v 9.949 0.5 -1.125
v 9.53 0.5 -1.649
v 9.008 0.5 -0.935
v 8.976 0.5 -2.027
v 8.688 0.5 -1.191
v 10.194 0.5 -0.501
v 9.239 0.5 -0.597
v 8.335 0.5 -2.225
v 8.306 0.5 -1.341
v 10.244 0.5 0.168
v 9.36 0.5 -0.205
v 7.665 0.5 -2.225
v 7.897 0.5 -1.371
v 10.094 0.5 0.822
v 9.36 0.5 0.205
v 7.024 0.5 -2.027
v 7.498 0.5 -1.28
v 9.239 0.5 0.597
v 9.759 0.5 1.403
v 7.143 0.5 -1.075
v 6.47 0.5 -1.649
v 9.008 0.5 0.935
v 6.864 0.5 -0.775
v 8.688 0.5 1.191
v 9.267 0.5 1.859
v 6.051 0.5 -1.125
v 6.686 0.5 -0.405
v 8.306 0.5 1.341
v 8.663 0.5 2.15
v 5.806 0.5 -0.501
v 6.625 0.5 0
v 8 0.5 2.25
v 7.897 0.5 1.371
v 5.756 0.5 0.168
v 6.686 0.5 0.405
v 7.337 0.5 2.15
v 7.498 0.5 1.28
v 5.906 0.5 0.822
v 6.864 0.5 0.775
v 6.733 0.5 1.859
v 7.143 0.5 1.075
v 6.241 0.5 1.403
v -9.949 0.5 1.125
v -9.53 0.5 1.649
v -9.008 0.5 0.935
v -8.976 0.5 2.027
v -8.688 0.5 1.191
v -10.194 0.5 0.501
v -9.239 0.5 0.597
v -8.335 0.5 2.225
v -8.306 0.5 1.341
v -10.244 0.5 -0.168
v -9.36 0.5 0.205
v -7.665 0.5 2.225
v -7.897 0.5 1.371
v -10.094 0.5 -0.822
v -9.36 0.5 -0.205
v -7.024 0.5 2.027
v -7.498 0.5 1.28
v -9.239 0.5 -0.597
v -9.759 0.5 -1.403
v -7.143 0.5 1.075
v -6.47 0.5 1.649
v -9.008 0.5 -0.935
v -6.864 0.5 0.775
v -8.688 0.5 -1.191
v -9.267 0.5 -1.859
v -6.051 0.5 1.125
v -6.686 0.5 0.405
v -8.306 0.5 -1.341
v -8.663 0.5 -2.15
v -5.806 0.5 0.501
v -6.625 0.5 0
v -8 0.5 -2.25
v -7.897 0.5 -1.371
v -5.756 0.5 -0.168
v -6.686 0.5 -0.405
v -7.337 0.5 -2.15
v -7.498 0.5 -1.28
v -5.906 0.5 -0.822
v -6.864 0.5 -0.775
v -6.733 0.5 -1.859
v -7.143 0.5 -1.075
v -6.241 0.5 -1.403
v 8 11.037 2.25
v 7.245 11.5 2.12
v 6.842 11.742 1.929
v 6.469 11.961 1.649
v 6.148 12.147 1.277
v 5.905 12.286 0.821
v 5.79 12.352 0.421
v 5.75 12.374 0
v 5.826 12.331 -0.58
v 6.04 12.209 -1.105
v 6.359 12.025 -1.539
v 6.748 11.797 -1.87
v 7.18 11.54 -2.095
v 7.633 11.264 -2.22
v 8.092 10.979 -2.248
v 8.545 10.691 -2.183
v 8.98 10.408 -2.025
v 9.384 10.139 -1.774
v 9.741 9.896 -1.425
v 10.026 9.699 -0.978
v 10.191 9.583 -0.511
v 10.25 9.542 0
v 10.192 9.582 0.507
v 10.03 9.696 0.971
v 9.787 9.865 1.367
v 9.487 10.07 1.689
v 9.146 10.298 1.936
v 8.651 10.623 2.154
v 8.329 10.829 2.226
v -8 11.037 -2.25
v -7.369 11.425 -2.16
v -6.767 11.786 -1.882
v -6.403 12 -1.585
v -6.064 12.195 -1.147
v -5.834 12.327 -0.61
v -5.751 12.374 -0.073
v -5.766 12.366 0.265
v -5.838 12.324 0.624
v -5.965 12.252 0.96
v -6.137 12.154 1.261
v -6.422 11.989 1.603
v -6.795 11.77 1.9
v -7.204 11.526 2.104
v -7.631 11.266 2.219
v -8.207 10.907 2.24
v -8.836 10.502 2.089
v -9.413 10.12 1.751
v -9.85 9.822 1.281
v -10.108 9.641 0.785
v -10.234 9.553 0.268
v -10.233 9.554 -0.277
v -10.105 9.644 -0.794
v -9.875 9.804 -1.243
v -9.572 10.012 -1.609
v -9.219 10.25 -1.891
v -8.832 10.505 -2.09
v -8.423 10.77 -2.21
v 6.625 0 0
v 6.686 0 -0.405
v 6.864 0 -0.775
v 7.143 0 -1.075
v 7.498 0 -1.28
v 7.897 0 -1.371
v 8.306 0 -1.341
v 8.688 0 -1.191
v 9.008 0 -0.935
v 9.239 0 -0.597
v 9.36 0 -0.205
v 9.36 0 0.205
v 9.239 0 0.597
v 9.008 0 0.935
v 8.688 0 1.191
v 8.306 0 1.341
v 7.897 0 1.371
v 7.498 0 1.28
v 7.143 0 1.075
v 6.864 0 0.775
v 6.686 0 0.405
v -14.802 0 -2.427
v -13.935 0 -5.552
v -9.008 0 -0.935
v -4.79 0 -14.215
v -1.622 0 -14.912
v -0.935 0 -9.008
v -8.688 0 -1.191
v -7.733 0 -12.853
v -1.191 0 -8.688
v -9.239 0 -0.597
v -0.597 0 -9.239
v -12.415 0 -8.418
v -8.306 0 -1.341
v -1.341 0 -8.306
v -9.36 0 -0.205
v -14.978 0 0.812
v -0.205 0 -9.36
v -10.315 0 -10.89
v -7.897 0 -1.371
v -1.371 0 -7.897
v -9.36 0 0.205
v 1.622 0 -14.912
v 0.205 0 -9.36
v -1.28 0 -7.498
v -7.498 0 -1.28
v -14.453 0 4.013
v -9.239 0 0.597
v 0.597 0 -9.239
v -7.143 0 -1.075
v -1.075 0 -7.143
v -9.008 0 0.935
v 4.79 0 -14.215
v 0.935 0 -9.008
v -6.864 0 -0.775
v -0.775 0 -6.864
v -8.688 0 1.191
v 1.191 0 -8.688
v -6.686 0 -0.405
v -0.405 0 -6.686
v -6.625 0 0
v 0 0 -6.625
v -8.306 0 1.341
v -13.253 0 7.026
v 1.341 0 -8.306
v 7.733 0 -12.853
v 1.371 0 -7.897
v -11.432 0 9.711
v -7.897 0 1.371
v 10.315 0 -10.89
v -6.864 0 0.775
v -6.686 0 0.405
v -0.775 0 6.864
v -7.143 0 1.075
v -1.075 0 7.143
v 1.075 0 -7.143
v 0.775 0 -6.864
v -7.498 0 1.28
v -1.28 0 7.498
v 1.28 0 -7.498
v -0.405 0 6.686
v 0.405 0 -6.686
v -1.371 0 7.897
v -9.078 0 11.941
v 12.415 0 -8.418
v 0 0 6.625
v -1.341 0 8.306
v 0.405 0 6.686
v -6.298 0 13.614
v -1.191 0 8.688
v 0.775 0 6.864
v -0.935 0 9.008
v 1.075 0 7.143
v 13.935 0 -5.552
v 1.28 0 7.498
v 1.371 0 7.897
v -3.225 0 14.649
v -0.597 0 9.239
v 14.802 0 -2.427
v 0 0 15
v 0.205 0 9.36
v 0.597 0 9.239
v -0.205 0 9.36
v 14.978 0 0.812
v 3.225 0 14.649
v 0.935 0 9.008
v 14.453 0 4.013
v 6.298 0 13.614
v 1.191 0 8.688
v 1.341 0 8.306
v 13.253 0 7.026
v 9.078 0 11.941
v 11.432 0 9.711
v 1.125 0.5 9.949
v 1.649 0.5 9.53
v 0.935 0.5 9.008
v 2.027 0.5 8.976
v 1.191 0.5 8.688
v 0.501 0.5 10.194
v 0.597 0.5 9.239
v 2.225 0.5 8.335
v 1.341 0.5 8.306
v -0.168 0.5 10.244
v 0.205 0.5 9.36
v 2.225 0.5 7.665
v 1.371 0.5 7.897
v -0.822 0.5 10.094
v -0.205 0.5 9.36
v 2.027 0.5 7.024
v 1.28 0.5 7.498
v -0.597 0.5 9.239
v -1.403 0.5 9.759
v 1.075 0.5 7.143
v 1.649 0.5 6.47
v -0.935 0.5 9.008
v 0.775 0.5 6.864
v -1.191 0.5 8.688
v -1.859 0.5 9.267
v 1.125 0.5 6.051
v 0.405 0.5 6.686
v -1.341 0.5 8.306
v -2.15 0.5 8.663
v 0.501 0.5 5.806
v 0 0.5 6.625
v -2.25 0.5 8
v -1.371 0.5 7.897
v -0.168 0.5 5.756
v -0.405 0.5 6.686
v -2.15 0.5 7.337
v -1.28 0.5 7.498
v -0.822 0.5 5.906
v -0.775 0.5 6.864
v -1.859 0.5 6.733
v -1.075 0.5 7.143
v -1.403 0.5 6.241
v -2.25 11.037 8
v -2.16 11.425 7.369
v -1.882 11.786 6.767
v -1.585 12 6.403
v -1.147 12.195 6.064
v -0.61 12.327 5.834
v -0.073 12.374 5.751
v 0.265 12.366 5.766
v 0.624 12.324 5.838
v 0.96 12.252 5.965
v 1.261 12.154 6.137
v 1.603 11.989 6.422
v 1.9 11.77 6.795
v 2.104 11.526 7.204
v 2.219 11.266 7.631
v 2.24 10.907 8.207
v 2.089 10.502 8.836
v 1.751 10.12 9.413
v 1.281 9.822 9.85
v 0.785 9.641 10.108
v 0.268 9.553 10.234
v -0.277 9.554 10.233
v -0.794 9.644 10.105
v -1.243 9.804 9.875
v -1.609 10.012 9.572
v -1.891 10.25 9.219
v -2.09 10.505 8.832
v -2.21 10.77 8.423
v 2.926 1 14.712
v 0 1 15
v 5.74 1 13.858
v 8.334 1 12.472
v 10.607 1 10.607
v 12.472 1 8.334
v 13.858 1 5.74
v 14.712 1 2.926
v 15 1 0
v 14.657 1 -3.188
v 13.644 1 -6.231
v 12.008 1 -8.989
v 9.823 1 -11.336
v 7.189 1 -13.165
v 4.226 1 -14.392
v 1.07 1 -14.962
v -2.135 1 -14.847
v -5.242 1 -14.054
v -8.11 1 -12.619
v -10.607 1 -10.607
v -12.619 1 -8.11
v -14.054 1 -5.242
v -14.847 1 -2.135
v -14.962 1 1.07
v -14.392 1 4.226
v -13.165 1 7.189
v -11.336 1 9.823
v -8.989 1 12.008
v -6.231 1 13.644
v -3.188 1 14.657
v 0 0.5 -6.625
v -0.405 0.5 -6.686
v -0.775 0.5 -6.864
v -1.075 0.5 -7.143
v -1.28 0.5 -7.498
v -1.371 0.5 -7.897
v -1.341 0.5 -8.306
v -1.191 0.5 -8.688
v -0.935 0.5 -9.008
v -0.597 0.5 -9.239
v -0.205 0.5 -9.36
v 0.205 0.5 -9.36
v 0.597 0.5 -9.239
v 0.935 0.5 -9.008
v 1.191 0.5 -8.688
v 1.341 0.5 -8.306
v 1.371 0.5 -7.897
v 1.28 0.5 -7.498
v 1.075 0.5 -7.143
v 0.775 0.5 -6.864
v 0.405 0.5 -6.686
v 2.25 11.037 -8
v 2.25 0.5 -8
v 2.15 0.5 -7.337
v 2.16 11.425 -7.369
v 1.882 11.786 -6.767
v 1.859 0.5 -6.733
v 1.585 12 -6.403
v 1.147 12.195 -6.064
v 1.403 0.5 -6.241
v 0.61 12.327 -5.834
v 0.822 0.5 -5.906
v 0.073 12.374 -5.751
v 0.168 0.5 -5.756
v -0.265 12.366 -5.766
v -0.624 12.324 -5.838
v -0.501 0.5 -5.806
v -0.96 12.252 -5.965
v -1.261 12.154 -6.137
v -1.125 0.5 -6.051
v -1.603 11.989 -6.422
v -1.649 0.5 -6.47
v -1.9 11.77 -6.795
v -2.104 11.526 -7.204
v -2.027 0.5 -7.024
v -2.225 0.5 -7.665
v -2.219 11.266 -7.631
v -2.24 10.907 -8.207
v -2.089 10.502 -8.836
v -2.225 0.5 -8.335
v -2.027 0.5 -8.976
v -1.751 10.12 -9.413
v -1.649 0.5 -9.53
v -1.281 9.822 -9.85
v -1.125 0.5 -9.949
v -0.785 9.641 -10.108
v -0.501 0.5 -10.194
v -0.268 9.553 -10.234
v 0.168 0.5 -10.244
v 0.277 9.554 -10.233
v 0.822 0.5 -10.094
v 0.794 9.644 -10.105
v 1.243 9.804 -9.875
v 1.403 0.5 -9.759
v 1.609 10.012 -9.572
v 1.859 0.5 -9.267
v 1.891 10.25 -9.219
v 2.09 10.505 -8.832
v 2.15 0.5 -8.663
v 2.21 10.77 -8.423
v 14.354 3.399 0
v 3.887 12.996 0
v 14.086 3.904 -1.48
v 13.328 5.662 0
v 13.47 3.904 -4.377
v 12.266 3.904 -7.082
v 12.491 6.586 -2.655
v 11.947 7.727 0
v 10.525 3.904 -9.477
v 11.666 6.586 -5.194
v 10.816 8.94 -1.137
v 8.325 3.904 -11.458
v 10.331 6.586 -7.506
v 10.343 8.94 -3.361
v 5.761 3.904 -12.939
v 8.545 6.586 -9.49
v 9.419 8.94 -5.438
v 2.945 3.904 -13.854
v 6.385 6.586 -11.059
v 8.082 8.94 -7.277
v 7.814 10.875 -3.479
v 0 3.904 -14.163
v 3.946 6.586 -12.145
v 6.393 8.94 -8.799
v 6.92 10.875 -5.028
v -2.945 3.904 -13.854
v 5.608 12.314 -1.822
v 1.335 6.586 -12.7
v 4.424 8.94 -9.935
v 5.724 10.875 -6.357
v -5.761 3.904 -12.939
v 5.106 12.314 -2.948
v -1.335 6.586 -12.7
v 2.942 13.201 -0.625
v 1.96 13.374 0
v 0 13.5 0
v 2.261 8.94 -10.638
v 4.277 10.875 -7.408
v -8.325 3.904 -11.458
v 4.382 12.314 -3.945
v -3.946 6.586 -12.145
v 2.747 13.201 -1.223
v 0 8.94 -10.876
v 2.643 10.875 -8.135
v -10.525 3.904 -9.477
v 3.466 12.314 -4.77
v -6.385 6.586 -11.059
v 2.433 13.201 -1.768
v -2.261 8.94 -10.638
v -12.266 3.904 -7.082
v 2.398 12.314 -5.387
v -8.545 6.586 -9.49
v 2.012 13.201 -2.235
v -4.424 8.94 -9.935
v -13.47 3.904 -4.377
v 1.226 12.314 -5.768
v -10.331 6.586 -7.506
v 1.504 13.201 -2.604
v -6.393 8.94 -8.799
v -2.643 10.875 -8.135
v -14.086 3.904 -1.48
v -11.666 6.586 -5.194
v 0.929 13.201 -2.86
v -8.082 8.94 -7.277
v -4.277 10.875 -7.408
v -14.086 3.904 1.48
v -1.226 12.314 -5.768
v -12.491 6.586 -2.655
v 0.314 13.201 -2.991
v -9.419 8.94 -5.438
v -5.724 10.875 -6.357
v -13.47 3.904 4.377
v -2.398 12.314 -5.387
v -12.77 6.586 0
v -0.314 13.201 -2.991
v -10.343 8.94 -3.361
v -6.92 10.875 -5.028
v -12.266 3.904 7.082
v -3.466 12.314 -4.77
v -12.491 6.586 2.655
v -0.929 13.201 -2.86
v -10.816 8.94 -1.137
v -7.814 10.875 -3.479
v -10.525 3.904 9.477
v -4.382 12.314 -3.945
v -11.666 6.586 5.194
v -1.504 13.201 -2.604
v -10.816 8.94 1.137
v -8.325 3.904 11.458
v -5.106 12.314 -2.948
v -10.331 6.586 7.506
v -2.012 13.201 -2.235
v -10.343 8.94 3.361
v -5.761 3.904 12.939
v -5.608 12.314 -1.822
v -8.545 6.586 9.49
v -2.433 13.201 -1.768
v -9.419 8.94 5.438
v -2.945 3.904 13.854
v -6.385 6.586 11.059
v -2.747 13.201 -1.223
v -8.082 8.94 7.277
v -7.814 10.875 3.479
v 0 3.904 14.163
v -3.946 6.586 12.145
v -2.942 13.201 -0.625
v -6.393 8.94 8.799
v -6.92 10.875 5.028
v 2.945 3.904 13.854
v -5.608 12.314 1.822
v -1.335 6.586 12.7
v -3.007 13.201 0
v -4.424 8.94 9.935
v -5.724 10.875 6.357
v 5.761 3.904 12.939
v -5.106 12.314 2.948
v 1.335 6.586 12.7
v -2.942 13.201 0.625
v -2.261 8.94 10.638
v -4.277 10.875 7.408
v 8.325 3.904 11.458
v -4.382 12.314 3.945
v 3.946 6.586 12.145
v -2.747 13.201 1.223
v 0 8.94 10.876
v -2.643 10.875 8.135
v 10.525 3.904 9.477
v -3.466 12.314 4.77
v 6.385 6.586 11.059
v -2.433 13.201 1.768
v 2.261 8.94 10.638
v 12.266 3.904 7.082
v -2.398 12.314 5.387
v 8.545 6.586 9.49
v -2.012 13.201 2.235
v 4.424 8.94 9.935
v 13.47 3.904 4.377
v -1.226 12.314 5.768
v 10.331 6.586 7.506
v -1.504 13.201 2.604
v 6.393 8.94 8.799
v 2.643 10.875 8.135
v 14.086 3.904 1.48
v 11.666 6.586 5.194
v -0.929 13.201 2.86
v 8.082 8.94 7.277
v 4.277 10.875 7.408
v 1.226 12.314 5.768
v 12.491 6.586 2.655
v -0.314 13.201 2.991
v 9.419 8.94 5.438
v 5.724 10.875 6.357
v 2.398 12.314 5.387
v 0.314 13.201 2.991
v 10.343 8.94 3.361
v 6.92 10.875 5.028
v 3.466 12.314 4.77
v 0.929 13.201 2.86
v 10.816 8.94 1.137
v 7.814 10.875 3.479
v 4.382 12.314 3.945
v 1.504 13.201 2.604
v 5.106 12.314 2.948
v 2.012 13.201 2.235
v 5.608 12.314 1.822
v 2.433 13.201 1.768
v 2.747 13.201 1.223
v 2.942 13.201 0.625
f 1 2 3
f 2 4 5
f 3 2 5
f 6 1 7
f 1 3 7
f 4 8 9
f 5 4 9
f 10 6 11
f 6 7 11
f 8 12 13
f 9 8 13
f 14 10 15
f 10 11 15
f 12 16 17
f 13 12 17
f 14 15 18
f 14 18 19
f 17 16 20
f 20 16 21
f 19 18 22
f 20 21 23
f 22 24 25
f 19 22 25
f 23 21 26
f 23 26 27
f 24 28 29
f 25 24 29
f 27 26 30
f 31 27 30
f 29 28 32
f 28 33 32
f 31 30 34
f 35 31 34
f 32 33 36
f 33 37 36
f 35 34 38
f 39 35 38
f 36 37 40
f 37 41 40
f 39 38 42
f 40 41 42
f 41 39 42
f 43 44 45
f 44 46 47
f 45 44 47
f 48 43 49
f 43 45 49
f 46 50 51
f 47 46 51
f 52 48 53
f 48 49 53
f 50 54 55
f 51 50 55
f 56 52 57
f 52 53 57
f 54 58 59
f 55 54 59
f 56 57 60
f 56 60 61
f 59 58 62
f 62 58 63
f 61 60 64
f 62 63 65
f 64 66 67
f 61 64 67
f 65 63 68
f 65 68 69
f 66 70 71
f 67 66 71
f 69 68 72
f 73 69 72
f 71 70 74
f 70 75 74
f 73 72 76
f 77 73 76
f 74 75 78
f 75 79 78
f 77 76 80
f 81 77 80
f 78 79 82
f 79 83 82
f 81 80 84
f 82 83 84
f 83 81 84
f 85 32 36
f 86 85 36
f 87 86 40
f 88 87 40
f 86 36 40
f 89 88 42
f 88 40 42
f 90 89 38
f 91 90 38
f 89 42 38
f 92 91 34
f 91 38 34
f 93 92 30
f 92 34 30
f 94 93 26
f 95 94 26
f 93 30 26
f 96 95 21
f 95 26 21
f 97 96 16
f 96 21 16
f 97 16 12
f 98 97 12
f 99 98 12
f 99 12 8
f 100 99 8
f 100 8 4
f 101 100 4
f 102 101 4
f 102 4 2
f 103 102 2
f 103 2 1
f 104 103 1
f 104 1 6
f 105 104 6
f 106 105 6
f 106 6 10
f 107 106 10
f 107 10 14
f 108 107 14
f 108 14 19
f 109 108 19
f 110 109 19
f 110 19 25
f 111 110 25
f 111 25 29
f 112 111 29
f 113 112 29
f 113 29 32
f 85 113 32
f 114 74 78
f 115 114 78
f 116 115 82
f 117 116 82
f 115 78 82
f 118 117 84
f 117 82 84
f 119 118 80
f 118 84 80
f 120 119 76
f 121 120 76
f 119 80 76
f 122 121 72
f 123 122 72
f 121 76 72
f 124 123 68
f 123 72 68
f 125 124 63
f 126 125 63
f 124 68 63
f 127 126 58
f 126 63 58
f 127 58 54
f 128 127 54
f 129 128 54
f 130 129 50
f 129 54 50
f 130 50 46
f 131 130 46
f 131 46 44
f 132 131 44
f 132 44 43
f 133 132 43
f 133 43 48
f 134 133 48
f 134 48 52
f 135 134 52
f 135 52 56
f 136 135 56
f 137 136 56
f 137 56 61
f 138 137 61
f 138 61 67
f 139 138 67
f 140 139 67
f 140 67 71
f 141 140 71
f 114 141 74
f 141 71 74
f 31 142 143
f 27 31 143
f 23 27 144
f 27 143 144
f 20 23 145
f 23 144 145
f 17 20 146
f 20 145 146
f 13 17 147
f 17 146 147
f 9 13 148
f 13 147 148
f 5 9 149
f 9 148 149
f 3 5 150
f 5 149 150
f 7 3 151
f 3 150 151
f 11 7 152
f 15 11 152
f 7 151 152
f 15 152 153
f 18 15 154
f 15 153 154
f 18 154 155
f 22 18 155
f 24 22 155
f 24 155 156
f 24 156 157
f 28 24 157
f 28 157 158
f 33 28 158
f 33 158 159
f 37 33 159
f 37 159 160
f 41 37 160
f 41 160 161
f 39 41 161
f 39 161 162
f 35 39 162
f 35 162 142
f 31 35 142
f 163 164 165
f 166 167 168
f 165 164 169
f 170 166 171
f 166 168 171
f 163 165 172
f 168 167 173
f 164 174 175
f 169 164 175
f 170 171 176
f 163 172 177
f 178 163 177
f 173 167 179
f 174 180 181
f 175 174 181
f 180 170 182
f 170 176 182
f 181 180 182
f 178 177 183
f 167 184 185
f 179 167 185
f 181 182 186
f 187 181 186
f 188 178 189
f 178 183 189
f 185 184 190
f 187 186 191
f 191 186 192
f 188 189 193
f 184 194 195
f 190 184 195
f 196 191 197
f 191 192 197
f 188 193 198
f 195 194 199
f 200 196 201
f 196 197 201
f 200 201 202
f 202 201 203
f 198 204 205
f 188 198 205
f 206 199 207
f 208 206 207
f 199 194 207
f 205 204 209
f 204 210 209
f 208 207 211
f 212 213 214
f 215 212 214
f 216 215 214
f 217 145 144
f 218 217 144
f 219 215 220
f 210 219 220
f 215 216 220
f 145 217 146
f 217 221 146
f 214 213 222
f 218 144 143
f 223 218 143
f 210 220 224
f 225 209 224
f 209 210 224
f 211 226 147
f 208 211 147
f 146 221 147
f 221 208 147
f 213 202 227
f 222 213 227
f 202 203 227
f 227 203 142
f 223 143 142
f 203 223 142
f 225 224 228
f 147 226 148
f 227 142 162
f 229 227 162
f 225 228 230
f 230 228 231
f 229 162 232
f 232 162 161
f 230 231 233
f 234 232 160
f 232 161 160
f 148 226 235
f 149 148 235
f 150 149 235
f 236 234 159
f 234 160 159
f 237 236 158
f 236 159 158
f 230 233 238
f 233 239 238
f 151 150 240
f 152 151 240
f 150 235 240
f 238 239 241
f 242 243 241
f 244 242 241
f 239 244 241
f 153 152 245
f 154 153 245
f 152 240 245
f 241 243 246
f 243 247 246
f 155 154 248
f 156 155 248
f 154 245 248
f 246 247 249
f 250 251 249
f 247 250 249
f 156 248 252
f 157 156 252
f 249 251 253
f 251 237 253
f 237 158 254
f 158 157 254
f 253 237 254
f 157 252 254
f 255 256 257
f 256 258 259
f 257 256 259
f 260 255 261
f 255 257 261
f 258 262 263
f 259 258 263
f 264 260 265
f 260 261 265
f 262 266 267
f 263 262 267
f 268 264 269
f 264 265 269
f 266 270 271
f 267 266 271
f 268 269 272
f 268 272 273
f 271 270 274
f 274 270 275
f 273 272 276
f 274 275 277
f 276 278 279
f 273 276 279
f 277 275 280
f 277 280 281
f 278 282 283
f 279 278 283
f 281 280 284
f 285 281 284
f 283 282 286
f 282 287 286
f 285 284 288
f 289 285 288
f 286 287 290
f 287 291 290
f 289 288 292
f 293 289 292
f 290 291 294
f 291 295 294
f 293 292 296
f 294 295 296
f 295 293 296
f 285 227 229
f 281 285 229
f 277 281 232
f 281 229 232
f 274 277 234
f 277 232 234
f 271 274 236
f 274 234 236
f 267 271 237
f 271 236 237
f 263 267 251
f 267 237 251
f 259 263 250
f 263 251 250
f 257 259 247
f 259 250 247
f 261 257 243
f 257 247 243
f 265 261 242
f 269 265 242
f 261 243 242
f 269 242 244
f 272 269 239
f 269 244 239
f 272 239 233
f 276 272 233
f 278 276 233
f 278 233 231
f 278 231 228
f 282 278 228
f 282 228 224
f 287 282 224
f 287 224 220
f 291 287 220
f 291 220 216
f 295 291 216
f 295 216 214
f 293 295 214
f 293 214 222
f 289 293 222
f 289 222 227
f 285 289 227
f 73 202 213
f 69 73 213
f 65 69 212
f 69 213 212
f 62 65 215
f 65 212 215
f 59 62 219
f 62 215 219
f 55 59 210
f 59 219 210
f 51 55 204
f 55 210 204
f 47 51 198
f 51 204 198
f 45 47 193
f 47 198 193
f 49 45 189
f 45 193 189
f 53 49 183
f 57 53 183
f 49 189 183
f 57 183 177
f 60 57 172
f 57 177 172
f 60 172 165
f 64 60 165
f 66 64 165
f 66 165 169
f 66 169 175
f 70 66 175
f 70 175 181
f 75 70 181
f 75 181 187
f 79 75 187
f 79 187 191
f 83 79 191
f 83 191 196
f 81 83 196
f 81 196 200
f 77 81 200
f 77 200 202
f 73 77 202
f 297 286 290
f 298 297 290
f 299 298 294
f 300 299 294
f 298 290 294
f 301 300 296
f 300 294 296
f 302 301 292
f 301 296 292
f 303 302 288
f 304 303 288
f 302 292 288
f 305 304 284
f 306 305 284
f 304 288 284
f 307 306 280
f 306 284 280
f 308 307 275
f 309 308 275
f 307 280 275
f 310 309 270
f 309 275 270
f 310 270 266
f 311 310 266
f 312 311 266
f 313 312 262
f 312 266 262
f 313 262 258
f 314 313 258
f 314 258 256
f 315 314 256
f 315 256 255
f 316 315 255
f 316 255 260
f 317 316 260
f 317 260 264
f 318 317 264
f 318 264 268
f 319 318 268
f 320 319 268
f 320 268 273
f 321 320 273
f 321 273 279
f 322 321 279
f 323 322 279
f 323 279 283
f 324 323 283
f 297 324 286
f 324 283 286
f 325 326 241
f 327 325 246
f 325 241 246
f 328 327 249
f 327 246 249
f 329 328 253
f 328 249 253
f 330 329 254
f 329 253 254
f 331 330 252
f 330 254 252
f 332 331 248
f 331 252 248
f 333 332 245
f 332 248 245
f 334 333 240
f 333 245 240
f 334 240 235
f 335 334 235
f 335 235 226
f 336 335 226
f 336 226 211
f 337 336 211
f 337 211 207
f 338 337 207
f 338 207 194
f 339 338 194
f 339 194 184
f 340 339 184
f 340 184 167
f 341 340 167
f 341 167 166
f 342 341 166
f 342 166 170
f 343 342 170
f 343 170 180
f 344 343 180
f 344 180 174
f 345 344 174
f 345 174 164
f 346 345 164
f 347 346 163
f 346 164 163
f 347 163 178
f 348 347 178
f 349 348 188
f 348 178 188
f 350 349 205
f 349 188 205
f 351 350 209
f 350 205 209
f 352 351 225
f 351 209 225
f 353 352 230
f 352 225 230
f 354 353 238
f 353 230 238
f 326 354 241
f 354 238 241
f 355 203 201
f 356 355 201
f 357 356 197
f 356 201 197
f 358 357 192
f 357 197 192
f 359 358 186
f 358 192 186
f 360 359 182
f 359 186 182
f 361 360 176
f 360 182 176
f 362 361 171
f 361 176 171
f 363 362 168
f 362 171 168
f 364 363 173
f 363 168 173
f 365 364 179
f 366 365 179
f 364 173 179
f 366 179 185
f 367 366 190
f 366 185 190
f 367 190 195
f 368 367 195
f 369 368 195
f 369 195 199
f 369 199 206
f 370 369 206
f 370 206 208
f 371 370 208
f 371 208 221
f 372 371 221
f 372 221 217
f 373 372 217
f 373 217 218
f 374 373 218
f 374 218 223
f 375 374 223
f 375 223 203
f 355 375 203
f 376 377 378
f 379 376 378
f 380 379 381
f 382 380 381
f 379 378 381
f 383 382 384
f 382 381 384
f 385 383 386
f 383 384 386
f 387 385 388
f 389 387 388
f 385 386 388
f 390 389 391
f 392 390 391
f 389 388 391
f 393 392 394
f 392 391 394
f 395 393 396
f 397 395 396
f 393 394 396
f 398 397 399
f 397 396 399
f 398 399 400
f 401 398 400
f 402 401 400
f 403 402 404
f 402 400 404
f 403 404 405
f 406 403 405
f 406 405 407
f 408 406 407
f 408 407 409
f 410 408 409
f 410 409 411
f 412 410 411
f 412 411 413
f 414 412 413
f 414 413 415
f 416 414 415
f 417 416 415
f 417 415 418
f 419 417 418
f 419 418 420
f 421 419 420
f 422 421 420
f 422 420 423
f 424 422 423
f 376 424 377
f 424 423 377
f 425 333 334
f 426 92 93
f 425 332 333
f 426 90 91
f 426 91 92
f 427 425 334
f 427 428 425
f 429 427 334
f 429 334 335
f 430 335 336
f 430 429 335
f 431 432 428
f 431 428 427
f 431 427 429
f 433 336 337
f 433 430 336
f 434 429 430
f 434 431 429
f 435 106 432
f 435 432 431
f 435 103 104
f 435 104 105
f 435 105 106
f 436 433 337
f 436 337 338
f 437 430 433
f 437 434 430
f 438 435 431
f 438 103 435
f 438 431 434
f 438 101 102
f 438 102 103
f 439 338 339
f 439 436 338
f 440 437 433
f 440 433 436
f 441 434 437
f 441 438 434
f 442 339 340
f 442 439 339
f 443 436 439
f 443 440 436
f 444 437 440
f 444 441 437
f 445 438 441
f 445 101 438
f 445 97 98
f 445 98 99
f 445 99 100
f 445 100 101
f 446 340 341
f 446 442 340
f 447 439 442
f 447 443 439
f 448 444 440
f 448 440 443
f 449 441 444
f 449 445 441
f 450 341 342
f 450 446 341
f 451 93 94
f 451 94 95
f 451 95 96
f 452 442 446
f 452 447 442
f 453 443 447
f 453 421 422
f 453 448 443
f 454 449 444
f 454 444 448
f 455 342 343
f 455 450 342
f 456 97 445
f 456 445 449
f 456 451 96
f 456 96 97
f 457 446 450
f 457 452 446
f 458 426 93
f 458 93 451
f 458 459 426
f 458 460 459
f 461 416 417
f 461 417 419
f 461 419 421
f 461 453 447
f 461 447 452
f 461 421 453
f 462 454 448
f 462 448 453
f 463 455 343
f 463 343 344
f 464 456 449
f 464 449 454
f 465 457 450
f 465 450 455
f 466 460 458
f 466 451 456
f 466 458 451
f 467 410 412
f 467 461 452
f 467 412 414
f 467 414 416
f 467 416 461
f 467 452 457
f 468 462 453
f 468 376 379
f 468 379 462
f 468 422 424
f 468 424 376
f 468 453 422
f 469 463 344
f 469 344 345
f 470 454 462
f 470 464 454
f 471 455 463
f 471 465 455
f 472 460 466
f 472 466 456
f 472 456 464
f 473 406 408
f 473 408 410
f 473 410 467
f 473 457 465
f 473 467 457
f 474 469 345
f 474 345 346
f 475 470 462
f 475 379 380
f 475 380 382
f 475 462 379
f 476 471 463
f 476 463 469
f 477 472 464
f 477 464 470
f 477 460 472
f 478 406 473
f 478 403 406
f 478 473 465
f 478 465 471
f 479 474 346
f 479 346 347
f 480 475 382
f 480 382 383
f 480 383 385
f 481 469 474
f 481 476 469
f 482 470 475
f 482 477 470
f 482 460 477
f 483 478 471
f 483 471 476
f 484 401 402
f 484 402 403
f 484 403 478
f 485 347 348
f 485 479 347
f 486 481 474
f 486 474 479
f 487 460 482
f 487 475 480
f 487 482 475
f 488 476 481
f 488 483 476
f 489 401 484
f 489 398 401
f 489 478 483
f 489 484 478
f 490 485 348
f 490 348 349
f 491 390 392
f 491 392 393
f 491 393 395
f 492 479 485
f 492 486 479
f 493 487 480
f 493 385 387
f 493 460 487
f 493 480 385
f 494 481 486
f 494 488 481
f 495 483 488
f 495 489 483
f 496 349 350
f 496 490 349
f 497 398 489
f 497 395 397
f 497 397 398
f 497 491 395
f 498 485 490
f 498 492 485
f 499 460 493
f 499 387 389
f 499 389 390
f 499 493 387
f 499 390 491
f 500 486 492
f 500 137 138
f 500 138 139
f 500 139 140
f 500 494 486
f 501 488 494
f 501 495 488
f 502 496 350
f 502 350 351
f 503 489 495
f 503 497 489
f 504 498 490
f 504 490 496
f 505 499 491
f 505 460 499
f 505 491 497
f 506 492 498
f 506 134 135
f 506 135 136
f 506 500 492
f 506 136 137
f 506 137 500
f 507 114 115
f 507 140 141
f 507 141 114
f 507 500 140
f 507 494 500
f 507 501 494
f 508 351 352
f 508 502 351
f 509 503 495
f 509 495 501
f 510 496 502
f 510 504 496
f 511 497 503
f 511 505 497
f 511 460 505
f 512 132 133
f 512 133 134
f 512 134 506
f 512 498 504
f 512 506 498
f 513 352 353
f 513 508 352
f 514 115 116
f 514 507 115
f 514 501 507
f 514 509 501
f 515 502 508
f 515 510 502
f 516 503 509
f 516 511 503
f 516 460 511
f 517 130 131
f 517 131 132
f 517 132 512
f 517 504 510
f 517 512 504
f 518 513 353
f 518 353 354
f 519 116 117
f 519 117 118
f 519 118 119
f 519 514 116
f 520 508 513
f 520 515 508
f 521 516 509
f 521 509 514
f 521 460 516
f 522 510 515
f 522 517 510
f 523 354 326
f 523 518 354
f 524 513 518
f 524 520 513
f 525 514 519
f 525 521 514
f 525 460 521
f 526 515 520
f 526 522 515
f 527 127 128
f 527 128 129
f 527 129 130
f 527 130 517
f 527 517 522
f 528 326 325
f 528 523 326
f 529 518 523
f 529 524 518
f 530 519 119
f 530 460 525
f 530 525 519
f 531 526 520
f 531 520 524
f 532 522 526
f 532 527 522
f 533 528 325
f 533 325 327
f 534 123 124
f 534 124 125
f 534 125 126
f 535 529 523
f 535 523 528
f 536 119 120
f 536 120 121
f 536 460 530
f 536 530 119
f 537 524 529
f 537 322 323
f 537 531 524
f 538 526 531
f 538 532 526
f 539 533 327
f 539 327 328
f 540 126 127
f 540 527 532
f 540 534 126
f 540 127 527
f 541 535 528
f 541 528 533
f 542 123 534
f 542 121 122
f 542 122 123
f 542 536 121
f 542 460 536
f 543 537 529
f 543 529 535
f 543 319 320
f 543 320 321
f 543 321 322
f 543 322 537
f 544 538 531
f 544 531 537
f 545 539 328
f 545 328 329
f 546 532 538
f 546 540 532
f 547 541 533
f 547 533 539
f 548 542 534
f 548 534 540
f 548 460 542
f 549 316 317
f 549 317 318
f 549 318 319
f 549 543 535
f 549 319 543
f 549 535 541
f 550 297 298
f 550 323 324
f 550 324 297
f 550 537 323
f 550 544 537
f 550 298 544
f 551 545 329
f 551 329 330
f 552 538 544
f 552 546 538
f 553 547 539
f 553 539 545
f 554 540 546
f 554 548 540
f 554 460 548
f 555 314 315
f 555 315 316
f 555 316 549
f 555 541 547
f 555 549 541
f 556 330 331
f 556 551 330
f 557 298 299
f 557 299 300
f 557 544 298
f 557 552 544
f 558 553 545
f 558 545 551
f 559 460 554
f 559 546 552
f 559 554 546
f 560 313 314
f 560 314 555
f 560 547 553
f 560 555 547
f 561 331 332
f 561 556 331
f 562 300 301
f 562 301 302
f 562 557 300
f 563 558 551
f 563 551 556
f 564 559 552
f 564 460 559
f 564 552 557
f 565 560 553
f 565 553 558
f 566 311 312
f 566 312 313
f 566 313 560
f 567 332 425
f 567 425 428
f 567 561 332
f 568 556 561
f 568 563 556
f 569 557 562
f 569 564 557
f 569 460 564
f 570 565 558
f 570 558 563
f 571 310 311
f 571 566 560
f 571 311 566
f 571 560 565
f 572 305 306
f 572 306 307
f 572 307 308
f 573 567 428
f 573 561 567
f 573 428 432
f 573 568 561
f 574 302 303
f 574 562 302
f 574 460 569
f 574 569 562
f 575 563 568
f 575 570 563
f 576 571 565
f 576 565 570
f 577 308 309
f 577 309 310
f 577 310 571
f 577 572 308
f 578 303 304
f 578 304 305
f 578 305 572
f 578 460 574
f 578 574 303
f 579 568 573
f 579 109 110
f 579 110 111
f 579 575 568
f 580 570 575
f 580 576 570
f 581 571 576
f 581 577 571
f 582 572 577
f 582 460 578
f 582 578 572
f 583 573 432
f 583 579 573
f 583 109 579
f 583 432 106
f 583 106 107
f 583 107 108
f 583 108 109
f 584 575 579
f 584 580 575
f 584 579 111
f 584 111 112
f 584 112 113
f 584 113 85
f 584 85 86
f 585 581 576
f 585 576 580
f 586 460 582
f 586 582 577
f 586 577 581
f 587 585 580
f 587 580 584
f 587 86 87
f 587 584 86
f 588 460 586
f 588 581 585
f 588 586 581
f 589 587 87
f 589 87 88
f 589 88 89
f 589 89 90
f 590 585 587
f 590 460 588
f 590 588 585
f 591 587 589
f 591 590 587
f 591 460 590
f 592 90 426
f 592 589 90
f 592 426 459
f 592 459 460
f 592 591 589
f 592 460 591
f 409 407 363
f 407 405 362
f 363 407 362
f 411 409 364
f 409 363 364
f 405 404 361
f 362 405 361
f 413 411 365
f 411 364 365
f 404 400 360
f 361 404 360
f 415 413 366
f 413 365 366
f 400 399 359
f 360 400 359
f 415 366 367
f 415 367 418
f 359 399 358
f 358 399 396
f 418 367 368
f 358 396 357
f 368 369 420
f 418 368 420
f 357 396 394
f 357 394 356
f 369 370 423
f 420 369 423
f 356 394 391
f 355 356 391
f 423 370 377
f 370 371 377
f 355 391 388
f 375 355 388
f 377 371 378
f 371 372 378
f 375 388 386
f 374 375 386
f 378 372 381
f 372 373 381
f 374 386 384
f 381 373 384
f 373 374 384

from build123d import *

# Parameters (mm, degrees)
SKETCH1_R               = 15
BOSS_EXTRUDE1_DEPTH     = 1
CUT_EXTRUDE1_REACH      = 27.145
CUT_EXTRUDE1_END_RADIUS = 15.25
SKETCH3_R               = 1.375
CIRPATTERN1_COUNT       = 4
CUT_EXTRUDE2_REACH      = 27.645
CUT_EXTRUDE2_END_RADIUS = 15.25
CUT_EXTRUDE2_START      = -0.5
SKETCH8_R               = 2.25
CIRPATTERN2_COUNT       = 4


with BuildPart() as part:
    # Sketch1 → Boss-Extrude1 (new body)
    with BuildSketch(Plane(origin=(0, 0, 0), x_dir=(1, 0, 0), z_dir=(0, 1, 0))):
        with Locations(Location((0, 0, 0), (0, 0, 270))):
            Circle(SKETCH1_R)
    extrude(amount=BOSS_EXTRUDE1_DEPTH)

    # Sketch2 → Revolve1 (revolve)
    with BuildSketch(Plane.XY, mode=Mode.PRIVATE) as revolve1_sk:
        with BuildLine():
            Line((0, 1), (-15, 1))
            ThreePointArc((-15, 1), (-9.762812095, 9.965374514), (0, 13.5))
            Line((0, 13.5), (0, 1))
        make_face()
    revolve(revolve1_sk.sketch.rotate(Axis((0, 1, 0), (0, 1, 0)), 180), axis=Axis((0, 1, 0), (0, 1, 0)))

    # Cut-Extrude1: up to this sphere (the profile starts inside it)
    cut_extrude1_end = Location((0, -1.75, 0)) * Sphere(CUT_EXTRUDE1_END_RADIUS, mode=Mode.PRIVATE)
    # Sketch3 → Cut-Extrude1 (cut, up to the surface)
    with BuildSketch(Plane.XZ, mode=Mode.PRIVATE) as cut_extrude1_sk1:
        with Locations(Location((0, 8, 0), (0, 0, 270))):
            Circle(SKETCH3_R)
    cut_extrude1_tool1 = extrude(cut_extrude1_sk1.sketch, amount=-CUT_EXTRUDE1_REACH, mode=Mode.PRIVATE) & cut_extrude1_end
    cut_extrude1 = cut_extrude1_tool1.solids().sort_by_distance((0, 0, 8))[0]
    add(cut_extrude1, mode=Mode.SUBTRACT)

    # CirPattern1: Cut-Extrude1 ×4 about axis
    cirpattern1_axis = Axis((0, 0, 0), (0, 1, 0))
    for i in range(1, CIRPATTERN1_COUNT):
        add(cut_extrude1.rotate(cirpattern1_axis, i * 360 / CIRPATTERN1_COUNT), mode=Mode.SUBTRACT)

    # Cut-Extrude2: up to this sphere (the profile starts inside it)
    cut_extrude2_end = Location((0, -1.75, 0)) * Sphere(CUT_EXTRUDE2_END_RADIUS, mode=Mode.PRIVATE)
    # Sketch8 → Cut-Extrude2 (cut, up to the surface)
    with BuildSketch(Plane.XZ.offset(CUT_EXTRUDE2_START), mode=Mode.PRIVATE) as cut_extrude2_sk1:
        with Locations(Location((-8, 0, 0), (0, 0, 270))):
            Circle(SKETCH8_R)
    cut_extrude2_tool1 = extrude(cut_extrude2_sk1.sketch, amount=-CUT_EXTRUDE2_REACH, mode=Mode.PRIVATE) & cut_extrude2_end
    cut_extrude2 = cut_extrude2_tool1.solids().sort_by_distance((-8, 0.5, 0))[0]
    add(cut_extrude2, mode=Mode.SUBTRACT)

    # CirPattern2: Cut-Extrude2 ×4 about axis
    cirpattern2_axis = Axis((0, 0, 0), (0, 1, 0))
    for i in range(1, CIRPATTERN2_COUNT):
        add(cut_extrude2.rotate(cirpattern2_axis, i * 360 / CIRPATTERN2_COUNT), mode=Mode.SUBTRACT)


solid = part.part
